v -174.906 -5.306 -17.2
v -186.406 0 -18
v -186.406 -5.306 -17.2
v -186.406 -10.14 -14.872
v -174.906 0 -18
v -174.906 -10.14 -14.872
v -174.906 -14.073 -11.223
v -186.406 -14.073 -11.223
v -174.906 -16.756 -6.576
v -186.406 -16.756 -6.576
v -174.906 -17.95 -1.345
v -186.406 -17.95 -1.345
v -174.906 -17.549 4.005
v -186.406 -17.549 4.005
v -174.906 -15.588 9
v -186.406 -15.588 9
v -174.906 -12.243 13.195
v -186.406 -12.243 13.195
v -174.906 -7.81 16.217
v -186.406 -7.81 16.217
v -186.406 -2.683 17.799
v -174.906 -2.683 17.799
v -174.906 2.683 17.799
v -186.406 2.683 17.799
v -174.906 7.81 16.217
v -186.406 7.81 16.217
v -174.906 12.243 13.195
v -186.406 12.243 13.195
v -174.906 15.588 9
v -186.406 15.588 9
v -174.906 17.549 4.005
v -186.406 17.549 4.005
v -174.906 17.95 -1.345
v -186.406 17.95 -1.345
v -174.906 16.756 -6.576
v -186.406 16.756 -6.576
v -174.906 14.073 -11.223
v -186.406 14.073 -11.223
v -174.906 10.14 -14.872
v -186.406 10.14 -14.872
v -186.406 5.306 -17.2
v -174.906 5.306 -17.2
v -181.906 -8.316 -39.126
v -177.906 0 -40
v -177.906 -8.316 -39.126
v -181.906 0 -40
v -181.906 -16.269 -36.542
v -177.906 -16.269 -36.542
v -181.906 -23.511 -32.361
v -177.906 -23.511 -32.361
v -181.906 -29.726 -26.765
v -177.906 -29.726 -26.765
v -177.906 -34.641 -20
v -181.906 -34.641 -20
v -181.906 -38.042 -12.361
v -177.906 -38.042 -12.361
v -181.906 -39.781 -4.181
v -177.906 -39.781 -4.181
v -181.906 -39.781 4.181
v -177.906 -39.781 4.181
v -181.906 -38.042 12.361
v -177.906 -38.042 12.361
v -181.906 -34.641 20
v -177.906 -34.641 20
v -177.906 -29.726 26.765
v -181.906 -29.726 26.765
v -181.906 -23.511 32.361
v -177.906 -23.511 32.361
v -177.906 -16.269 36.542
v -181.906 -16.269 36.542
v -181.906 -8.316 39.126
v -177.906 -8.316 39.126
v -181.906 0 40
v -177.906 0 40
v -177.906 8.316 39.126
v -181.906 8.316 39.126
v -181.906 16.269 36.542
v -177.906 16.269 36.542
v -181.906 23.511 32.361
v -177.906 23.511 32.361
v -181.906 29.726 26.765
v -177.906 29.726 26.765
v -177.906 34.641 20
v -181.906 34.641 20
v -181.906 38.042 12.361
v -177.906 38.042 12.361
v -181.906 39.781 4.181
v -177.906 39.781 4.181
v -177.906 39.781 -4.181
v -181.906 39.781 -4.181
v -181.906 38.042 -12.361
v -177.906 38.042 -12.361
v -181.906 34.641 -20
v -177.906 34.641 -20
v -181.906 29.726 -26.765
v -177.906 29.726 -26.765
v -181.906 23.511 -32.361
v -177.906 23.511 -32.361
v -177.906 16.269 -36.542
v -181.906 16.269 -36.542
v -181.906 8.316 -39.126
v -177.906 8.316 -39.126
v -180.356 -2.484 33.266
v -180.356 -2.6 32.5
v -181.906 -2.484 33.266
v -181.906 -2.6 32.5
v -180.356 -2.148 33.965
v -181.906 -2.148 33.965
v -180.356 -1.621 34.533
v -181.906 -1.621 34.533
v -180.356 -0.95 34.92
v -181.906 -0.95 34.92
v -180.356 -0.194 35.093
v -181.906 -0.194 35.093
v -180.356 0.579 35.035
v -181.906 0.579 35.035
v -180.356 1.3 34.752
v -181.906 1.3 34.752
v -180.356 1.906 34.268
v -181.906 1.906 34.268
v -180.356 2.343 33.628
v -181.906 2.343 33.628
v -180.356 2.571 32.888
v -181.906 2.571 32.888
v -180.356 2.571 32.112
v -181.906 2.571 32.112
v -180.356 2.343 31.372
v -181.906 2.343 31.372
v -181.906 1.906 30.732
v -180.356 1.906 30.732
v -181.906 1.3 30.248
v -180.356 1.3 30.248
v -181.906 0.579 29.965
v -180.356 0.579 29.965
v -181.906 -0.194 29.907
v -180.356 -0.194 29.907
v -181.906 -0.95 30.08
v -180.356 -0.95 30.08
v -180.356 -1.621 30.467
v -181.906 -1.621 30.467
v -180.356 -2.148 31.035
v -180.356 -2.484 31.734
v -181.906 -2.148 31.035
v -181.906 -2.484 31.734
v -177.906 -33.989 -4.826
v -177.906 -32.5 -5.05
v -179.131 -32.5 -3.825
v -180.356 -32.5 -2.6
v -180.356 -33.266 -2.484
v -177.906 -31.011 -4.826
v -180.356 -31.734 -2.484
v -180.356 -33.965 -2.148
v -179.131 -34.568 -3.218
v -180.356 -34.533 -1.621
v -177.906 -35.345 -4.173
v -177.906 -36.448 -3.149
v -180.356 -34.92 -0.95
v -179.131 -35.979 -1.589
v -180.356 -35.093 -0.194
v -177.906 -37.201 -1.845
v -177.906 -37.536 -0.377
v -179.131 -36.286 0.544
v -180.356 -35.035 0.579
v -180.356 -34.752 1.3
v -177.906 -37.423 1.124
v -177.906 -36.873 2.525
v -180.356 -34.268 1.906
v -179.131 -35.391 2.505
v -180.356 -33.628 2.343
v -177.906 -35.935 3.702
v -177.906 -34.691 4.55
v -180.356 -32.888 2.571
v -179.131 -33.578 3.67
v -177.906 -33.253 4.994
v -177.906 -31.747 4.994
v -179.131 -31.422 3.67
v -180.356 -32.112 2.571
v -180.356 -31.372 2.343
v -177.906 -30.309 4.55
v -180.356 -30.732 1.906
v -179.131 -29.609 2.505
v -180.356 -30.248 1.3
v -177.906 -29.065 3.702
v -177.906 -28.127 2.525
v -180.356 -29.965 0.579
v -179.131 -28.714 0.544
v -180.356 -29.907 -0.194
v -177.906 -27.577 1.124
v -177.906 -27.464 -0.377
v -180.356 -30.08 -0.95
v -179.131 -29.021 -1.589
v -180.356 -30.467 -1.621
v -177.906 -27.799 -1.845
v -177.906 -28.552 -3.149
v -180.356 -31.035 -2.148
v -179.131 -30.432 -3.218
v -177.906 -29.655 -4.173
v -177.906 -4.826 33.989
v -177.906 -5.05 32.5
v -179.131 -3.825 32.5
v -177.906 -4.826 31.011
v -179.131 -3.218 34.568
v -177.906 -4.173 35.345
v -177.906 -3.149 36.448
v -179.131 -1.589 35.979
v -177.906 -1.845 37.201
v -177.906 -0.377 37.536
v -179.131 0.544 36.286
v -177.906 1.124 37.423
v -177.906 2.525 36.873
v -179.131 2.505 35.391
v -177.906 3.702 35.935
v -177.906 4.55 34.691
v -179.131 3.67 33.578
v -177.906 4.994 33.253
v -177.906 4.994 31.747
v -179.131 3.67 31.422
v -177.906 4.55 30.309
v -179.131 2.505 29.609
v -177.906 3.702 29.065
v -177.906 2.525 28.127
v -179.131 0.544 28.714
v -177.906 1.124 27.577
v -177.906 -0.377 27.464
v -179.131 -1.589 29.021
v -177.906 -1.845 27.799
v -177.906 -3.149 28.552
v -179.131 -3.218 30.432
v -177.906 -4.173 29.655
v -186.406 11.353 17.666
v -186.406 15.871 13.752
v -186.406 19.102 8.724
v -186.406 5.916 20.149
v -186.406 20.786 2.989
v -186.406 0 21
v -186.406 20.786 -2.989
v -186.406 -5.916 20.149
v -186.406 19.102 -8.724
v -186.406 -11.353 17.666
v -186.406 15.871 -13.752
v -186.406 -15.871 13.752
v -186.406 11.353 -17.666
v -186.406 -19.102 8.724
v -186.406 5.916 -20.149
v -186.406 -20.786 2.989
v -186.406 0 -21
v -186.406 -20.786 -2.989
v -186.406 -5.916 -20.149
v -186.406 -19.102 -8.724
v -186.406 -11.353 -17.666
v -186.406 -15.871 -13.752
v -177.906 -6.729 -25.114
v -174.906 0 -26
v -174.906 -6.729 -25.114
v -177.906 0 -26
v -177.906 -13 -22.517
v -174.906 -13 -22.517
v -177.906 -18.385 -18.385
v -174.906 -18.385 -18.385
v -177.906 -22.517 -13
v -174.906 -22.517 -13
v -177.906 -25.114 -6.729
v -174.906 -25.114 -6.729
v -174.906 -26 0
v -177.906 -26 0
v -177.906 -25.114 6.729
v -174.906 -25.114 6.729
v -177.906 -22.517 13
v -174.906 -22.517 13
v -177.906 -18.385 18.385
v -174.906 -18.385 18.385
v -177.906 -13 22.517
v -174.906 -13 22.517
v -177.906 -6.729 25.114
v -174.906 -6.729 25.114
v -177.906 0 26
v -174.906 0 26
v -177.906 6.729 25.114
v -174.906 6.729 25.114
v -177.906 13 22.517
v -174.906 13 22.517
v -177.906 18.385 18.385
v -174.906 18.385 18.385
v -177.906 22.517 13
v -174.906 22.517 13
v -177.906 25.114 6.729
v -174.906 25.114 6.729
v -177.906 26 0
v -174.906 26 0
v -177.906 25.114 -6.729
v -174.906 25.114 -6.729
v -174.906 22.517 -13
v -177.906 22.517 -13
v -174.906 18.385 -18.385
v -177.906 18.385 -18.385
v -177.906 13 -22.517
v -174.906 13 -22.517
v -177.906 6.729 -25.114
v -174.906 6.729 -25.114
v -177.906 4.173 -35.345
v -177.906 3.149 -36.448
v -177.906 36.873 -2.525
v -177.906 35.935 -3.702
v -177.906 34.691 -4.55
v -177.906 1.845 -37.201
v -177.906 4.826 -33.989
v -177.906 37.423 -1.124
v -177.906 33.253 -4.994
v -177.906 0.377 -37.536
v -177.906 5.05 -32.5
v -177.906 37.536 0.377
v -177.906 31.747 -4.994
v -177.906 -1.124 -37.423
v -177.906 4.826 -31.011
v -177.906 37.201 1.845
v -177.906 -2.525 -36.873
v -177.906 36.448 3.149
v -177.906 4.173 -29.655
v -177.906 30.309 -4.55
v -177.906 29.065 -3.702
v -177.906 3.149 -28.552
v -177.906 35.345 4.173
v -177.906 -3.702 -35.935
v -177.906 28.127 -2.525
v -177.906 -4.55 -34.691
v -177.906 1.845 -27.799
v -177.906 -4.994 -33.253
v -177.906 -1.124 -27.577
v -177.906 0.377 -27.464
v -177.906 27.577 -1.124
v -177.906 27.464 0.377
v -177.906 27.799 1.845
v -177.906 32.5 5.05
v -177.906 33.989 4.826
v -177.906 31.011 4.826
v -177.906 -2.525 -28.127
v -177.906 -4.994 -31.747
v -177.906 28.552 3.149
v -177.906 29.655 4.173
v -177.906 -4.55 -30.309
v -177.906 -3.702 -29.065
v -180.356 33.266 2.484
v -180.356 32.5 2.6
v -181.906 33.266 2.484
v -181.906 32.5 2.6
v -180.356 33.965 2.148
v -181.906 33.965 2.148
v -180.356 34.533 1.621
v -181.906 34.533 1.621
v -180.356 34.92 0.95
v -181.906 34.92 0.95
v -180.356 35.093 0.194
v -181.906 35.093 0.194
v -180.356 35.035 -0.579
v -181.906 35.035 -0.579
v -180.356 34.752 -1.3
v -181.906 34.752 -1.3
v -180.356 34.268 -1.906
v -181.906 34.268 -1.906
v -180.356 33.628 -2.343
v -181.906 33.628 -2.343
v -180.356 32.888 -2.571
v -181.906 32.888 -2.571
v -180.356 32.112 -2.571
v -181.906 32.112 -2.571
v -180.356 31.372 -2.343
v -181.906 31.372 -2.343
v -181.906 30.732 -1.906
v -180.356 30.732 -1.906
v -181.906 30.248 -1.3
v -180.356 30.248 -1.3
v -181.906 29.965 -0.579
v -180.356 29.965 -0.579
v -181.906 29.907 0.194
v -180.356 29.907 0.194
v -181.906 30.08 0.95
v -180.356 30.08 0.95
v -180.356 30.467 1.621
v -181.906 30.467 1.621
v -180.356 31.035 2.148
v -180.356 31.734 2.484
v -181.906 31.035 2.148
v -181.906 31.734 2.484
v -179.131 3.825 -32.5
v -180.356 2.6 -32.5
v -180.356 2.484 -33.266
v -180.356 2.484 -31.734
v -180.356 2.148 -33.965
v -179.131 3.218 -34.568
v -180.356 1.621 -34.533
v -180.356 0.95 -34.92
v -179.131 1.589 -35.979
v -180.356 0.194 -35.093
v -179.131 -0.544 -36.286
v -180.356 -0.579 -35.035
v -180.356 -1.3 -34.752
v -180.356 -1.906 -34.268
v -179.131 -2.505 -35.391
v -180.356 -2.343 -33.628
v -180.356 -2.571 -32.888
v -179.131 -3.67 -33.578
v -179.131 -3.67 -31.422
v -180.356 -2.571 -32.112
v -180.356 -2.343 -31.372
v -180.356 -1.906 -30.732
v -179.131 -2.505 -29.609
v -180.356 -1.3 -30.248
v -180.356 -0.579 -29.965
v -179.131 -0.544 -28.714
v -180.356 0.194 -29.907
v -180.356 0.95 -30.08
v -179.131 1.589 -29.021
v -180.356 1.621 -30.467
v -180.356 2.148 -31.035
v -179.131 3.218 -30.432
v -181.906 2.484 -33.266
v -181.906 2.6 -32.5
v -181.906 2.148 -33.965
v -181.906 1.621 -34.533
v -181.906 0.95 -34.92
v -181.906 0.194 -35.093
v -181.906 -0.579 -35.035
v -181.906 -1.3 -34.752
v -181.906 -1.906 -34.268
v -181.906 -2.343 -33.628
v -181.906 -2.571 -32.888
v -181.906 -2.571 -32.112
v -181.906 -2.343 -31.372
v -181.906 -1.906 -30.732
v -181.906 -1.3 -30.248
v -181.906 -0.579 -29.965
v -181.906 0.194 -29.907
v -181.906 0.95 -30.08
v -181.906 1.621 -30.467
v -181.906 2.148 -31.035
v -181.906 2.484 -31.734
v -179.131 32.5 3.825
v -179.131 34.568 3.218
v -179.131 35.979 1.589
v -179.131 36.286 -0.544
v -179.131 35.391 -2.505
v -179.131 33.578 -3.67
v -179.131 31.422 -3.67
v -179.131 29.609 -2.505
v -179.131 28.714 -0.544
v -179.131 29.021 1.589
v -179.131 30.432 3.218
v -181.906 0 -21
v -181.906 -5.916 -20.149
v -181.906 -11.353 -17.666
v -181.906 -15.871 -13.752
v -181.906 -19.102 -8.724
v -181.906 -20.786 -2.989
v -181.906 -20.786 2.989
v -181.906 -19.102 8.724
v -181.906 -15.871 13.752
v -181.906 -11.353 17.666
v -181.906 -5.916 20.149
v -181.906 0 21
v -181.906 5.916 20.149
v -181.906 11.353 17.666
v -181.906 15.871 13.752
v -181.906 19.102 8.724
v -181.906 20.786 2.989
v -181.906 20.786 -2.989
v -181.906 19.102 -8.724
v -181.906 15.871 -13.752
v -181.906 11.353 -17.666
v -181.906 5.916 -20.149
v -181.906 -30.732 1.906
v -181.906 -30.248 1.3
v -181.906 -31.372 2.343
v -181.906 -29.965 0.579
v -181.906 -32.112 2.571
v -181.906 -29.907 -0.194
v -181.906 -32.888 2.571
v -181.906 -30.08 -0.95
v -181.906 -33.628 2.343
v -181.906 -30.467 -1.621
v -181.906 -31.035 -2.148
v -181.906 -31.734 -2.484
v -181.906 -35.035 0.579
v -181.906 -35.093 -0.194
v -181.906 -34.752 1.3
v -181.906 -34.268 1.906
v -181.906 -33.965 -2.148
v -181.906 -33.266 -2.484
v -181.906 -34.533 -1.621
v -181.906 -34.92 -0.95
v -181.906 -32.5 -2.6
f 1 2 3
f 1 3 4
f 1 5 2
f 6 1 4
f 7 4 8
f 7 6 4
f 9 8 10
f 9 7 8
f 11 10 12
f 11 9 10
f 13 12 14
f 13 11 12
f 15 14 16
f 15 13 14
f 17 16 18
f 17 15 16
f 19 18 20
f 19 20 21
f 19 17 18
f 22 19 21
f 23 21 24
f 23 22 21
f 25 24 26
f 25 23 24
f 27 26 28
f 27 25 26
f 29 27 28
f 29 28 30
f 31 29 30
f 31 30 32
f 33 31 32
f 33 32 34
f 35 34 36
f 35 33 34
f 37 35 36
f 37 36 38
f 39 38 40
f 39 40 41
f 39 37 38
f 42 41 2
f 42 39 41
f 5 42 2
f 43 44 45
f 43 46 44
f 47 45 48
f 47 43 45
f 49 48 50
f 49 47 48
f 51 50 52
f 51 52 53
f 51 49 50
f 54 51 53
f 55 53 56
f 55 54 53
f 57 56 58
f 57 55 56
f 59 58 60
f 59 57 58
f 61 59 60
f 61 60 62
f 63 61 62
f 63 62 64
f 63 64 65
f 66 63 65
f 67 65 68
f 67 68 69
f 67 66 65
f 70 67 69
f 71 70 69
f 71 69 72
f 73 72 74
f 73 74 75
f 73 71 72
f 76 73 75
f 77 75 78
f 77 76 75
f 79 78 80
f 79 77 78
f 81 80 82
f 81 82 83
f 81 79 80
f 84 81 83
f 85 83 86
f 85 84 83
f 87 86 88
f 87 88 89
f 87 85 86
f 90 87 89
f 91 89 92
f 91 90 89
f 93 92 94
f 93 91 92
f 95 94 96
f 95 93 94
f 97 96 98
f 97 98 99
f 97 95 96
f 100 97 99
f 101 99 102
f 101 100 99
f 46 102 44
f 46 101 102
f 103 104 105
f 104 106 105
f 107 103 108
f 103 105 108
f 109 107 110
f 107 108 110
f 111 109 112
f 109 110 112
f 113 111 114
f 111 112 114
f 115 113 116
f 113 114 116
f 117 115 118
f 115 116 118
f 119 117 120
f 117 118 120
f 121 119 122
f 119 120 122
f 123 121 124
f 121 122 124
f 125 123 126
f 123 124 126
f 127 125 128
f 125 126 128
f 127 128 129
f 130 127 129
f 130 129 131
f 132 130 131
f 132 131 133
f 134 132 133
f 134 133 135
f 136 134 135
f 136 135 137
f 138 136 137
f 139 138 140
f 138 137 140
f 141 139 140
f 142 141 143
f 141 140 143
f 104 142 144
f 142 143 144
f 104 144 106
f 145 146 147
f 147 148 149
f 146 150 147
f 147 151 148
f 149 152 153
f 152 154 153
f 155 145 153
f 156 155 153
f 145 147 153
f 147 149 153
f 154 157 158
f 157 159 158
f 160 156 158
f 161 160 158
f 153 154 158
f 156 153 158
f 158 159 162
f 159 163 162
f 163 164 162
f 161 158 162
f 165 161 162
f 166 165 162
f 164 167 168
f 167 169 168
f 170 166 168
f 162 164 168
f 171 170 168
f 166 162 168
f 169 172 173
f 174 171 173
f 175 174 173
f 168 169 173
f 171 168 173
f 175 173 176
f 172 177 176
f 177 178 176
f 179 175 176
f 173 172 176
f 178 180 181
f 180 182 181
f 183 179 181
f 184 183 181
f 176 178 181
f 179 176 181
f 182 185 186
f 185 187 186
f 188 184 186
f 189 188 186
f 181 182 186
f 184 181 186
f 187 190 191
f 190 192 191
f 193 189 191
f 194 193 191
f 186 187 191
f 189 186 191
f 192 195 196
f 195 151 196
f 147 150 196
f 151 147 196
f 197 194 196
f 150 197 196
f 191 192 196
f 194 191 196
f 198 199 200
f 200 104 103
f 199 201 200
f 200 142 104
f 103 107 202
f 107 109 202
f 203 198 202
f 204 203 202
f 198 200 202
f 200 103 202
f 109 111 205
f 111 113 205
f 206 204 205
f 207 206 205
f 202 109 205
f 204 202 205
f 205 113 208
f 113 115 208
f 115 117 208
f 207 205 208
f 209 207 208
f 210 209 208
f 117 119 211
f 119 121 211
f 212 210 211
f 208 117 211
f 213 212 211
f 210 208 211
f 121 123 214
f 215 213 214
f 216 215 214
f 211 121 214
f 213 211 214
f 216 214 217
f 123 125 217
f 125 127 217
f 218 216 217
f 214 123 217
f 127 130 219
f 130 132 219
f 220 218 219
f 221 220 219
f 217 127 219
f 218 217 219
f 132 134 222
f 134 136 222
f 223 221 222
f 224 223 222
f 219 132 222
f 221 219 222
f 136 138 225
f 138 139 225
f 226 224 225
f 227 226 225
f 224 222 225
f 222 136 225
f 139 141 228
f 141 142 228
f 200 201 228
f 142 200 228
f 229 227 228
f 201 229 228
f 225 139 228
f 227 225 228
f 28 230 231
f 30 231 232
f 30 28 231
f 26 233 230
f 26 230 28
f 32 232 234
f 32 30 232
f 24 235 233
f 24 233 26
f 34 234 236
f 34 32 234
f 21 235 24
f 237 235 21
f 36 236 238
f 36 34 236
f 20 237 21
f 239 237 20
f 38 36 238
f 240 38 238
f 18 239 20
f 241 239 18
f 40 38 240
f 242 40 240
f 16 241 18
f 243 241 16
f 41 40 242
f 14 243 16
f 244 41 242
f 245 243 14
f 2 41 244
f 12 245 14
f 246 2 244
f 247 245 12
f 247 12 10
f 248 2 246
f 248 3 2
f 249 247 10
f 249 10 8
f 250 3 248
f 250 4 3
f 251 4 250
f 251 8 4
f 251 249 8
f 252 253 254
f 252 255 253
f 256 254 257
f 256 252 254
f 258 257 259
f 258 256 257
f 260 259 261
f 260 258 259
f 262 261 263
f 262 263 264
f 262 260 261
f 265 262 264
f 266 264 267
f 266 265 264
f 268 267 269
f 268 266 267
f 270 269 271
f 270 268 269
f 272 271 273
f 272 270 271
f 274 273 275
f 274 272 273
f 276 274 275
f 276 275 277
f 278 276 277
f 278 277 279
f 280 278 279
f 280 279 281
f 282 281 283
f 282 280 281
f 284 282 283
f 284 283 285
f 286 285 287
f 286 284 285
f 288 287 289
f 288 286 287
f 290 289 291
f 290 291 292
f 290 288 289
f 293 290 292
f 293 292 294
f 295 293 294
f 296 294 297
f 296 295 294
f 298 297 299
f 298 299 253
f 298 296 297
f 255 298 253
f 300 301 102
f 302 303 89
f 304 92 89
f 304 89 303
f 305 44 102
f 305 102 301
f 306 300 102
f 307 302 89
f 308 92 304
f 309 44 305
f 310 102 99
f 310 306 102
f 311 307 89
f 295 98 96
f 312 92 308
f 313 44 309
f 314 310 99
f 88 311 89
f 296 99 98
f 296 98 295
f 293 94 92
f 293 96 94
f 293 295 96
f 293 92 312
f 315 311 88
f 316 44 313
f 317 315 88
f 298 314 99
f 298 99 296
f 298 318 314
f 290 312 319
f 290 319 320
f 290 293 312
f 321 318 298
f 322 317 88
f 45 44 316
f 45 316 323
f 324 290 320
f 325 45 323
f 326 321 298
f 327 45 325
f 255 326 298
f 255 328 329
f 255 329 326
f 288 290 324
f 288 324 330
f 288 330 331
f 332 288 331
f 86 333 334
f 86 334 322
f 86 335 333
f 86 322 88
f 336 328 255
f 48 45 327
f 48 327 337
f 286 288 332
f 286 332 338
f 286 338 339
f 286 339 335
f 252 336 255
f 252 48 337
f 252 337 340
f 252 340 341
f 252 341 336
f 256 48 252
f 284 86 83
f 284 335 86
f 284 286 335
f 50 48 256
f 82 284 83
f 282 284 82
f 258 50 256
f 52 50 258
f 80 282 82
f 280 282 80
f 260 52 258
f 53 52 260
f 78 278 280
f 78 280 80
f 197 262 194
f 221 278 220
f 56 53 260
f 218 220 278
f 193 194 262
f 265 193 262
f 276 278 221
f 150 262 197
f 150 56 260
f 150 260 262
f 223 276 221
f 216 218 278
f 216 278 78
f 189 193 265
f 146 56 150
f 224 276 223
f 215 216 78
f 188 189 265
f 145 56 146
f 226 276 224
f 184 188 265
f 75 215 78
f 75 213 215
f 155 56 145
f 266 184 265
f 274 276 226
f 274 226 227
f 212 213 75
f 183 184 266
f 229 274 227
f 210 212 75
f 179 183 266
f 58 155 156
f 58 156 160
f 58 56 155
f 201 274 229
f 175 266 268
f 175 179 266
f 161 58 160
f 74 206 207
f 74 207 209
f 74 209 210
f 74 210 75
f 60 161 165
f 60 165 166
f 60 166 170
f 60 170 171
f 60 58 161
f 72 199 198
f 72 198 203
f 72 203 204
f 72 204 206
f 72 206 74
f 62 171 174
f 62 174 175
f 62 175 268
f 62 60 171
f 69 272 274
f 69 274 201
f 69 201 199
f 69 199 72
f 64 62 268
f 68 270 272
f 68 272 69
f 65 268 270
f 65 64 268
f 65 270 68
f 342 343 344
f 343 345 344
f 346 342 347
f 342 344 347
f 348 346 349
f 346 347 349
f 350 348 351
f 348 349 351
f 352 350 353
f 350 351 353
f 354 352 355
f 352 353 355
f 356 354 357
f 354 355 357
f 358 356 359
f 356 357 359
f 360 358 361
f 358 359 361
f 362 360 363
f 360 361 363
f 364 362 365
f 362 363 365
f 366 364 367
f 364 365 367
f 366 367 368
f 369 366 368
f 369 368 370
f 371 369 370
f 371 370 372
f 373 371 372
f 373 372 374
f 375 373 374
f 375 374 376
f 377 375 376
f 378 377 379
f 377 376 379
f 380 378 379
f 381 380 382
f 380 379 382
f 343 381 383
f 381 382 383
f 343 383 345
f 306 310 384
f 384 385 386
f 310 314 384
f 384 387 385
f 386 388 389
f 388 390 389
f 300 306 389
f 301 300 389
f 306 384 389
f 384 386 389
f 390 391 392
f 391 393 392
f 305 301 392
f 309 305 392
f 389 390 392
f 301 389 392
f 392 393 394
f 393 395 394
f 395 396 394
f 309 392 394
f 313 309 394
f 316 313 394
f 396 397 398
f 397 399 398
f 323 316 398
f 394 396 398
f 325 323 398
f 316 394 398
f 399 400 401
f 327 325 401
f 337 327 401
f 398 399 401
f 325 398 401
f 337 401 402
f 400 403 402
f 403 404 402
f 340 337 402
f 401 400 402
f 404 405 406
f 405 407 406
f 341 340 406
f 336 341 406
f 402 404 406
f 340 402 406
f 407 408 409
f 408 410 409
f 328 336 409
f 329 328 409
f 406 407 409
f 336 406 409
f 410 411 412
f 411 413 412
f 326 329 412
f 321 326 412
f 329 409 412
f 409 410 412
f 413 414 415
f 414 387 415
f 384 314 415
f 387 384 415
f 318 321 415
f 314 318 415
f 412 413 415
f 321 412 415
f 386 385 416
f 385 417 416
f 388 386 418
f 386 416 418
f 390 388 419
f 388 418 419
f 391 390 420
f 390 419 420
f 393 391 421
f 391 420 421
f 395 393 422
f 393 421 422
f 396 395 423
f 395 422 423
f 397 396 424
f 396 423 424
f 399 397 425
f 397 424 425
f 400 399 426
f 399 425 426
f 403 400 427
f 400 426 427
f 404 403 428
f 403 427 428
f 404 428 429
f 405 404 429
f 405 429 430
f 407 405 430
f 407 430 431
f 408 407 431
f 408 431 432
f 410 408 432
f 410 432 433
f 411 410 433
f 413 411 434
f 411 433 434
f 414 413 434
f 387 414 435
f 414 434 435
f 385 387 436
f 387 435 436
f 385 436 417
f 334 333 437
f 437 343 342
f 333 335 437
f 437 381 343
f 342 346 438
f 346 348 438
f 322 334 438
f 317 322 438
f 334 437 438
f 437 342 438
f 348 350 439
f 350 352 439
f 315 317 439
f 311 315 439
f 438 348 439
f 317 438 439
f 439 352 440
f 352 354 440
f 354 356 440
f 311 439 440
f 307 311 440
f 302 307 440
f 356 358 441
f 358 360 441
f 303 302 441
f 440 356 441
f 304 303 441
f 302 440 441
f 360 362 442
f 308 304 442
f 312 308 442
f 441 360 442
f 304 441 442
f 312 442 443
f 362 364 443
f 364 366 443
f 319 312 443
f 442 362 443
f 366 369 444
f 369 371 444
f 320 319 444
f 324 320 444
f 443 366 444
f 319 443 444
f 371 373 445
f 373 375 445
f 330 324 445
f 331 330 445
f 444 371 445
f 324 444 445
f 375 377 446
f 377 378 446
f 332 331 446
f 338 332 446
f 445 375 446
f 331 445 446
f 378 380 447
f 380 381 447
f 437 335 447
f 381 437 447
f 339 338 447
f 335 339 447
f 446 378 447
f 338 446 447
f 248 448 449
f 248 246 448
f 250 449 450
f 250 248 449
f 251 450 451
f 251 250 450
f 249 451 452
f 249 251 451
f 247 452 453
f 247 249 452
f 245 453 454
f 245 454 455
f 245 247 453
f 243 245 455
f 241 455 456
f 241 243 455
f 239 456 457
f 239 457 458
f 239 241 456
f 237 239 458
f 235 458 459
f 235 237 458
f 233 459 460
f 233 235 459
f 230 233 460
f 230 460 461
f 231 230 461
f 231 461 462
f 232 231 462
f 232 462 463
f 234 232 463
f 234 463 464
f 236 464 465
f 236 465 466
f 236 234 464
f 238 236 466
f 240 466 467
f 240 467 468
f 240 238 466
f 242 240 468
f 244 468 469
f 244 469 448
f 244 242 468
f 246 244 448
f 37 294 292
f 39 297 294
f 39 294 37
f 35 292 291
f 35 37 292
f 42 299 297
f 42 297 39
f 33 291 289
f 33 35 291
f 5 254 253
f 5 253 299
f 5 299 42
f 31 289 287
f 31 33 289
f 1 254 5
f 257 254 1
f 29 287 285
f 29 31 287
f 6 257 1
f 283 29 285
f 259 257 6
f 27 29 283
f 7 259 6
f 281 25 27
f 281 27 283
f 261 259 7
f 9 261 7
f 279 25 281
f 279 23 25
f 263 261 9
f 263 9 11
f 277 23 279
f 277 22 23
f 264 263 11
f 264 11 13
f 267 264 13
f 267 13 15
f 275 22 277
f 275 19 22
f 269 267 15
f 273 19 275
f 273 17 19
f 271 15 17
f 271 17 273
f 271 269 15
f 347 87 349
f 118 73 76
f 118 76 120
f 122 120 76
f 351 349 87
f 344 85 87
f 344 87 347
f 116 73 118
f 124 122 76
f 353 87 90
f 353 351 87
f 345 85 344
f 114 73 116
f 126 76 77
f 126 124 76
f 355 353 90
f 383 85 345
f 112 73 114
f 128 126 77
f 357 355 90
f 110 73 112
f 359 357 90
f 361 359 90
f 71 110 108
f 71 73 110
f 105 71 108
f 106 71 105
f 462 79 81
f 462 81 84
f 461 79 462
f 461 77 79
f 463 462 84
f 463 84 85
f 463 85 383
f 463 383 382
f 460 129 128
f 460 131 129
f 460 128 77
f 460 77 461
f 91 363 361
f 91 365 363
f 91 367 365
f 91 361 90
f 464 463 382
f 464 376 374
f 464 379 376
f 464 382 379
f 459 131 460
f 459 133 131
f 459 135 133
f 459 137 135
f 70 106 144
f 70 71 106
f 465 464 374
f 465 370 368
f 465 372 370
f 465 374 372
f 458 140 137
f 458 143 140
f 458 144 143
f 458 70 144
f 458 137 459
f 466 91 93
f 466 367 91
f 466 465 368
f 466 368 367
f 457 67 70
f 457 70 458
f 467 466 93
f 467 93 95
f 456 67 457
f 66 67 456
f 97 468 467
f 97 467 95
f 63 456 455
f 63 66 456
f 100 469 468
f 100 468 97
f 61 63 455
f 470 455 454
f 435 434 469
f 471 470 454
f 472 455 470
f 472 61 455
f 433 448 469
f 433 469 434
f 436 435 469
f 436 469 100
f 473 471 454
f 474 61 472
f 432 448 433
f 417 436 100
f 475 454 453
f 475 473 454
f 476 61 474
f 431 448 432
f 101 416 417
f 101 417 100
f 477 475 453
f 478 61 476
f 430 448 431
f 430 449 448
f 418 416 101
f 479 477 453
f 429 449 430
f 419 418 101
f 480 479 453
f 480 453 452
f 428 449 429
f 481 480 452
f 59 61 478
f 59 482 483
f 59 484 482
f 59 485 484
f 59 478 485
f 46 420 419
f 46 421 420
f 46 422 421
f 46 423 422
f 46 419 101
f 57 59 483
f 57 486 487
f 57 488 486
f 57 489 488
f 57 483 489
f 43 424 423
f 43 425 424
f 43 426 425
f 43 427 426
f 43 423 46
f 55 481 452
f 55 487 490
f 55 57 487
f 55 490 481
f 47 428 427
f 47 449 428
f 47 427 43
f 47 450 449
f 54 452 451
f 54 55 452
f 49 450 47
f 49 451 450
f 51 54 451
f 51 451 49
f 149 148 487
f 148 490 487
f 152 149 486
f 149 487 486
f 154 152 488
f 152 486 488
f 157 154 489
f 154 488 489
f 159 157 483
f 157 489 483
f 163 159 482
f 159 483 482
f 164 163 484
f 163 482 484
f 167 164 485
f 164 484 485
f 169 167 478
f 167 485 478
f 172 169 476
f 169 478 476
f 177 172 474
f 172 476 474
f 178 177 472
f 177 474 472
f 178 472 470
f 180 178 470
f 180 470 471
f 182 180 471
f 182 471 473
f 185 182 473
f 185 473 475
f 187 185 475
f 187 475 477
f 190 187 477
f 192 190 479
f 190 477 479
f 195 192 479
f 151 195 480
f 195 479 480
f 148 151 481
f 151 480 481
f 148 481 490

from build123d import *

# Parameters (mm, degrees)
CSK_FOR_M5_COUNTERSUNK_FLAT_HEAD_SCREW1_D           = 5.2
CSK_FOR_M5_COUNTERSUNK_FLAT_HEAD_SCREW1_CSINK_D     = 10.1
CSK_FOR_M5_COUNTERSUNK_FLAT_HEAD_SCREW1_CSINK_ANGLE = 90
CIRPATTERN1_COUNT                                   = 4


with BuildPart() as part:
    # Sketch2 → Revolve1 (revolve)
    with BuildSketch(Plane.XY, mode=Mode.PRIVATE) as revolve1_sk:
        Polygon((-174.905599099, 26), (-177.905599099, 26), (-177.905599099, 40), (-181.905599099, 40), (-181.905599099, 21), (-186.405599099, 21), (-186.405599099, 18), (-174.905599099, 18), align=None)
    revolve(revolve1_sk.sketch.rotate(Axis((0, 0, 0), (-1, 0, 0)), 90), axis=Axis((0, 0, 0), (-1, 0, 0)))

    # CSK for M5 Countersunk Flat Head Screw1 (through all)
    with Locations(Plane(origin=(-177.905599099, 0, 0), x_dir=(0, 0, -1), z_dir=(1, 0, 0))):
        with Locations((0, 32.5)):
            csk_for_m5_countersunk_flat_head_screw1 = CounterSinkHole(CSK_FOR_M5_COUNTERSUNK_FLAT_HEAD_SCREW1_D / 2, CSK_FOR_M5_COUNTERSUNK_FLAT_HEAD_SCREW1_CSINK_D / 2, counter_sink_angle=CSK_FOR_M5_COUNTERSUNK_FLAT_HEAD_SCREW1_CSINK_ANGLE)

    # CirPattern1: CSK for M5 Countersunk Flat Head Screw1 ×4 about axis
    cirpattern1_axis = Axis((0, 0, 0), (1, 0, 0))
    for i in range(1, CIRPATTERN1_COUNT):
        add(csk_for_m5_countersunk_flat_head_screw1.rotate(cirpattern1_axis, i * 360 / CIRPATTERN1_COUNT), mode=Mode.SUBTRACT)


solid = part.part
